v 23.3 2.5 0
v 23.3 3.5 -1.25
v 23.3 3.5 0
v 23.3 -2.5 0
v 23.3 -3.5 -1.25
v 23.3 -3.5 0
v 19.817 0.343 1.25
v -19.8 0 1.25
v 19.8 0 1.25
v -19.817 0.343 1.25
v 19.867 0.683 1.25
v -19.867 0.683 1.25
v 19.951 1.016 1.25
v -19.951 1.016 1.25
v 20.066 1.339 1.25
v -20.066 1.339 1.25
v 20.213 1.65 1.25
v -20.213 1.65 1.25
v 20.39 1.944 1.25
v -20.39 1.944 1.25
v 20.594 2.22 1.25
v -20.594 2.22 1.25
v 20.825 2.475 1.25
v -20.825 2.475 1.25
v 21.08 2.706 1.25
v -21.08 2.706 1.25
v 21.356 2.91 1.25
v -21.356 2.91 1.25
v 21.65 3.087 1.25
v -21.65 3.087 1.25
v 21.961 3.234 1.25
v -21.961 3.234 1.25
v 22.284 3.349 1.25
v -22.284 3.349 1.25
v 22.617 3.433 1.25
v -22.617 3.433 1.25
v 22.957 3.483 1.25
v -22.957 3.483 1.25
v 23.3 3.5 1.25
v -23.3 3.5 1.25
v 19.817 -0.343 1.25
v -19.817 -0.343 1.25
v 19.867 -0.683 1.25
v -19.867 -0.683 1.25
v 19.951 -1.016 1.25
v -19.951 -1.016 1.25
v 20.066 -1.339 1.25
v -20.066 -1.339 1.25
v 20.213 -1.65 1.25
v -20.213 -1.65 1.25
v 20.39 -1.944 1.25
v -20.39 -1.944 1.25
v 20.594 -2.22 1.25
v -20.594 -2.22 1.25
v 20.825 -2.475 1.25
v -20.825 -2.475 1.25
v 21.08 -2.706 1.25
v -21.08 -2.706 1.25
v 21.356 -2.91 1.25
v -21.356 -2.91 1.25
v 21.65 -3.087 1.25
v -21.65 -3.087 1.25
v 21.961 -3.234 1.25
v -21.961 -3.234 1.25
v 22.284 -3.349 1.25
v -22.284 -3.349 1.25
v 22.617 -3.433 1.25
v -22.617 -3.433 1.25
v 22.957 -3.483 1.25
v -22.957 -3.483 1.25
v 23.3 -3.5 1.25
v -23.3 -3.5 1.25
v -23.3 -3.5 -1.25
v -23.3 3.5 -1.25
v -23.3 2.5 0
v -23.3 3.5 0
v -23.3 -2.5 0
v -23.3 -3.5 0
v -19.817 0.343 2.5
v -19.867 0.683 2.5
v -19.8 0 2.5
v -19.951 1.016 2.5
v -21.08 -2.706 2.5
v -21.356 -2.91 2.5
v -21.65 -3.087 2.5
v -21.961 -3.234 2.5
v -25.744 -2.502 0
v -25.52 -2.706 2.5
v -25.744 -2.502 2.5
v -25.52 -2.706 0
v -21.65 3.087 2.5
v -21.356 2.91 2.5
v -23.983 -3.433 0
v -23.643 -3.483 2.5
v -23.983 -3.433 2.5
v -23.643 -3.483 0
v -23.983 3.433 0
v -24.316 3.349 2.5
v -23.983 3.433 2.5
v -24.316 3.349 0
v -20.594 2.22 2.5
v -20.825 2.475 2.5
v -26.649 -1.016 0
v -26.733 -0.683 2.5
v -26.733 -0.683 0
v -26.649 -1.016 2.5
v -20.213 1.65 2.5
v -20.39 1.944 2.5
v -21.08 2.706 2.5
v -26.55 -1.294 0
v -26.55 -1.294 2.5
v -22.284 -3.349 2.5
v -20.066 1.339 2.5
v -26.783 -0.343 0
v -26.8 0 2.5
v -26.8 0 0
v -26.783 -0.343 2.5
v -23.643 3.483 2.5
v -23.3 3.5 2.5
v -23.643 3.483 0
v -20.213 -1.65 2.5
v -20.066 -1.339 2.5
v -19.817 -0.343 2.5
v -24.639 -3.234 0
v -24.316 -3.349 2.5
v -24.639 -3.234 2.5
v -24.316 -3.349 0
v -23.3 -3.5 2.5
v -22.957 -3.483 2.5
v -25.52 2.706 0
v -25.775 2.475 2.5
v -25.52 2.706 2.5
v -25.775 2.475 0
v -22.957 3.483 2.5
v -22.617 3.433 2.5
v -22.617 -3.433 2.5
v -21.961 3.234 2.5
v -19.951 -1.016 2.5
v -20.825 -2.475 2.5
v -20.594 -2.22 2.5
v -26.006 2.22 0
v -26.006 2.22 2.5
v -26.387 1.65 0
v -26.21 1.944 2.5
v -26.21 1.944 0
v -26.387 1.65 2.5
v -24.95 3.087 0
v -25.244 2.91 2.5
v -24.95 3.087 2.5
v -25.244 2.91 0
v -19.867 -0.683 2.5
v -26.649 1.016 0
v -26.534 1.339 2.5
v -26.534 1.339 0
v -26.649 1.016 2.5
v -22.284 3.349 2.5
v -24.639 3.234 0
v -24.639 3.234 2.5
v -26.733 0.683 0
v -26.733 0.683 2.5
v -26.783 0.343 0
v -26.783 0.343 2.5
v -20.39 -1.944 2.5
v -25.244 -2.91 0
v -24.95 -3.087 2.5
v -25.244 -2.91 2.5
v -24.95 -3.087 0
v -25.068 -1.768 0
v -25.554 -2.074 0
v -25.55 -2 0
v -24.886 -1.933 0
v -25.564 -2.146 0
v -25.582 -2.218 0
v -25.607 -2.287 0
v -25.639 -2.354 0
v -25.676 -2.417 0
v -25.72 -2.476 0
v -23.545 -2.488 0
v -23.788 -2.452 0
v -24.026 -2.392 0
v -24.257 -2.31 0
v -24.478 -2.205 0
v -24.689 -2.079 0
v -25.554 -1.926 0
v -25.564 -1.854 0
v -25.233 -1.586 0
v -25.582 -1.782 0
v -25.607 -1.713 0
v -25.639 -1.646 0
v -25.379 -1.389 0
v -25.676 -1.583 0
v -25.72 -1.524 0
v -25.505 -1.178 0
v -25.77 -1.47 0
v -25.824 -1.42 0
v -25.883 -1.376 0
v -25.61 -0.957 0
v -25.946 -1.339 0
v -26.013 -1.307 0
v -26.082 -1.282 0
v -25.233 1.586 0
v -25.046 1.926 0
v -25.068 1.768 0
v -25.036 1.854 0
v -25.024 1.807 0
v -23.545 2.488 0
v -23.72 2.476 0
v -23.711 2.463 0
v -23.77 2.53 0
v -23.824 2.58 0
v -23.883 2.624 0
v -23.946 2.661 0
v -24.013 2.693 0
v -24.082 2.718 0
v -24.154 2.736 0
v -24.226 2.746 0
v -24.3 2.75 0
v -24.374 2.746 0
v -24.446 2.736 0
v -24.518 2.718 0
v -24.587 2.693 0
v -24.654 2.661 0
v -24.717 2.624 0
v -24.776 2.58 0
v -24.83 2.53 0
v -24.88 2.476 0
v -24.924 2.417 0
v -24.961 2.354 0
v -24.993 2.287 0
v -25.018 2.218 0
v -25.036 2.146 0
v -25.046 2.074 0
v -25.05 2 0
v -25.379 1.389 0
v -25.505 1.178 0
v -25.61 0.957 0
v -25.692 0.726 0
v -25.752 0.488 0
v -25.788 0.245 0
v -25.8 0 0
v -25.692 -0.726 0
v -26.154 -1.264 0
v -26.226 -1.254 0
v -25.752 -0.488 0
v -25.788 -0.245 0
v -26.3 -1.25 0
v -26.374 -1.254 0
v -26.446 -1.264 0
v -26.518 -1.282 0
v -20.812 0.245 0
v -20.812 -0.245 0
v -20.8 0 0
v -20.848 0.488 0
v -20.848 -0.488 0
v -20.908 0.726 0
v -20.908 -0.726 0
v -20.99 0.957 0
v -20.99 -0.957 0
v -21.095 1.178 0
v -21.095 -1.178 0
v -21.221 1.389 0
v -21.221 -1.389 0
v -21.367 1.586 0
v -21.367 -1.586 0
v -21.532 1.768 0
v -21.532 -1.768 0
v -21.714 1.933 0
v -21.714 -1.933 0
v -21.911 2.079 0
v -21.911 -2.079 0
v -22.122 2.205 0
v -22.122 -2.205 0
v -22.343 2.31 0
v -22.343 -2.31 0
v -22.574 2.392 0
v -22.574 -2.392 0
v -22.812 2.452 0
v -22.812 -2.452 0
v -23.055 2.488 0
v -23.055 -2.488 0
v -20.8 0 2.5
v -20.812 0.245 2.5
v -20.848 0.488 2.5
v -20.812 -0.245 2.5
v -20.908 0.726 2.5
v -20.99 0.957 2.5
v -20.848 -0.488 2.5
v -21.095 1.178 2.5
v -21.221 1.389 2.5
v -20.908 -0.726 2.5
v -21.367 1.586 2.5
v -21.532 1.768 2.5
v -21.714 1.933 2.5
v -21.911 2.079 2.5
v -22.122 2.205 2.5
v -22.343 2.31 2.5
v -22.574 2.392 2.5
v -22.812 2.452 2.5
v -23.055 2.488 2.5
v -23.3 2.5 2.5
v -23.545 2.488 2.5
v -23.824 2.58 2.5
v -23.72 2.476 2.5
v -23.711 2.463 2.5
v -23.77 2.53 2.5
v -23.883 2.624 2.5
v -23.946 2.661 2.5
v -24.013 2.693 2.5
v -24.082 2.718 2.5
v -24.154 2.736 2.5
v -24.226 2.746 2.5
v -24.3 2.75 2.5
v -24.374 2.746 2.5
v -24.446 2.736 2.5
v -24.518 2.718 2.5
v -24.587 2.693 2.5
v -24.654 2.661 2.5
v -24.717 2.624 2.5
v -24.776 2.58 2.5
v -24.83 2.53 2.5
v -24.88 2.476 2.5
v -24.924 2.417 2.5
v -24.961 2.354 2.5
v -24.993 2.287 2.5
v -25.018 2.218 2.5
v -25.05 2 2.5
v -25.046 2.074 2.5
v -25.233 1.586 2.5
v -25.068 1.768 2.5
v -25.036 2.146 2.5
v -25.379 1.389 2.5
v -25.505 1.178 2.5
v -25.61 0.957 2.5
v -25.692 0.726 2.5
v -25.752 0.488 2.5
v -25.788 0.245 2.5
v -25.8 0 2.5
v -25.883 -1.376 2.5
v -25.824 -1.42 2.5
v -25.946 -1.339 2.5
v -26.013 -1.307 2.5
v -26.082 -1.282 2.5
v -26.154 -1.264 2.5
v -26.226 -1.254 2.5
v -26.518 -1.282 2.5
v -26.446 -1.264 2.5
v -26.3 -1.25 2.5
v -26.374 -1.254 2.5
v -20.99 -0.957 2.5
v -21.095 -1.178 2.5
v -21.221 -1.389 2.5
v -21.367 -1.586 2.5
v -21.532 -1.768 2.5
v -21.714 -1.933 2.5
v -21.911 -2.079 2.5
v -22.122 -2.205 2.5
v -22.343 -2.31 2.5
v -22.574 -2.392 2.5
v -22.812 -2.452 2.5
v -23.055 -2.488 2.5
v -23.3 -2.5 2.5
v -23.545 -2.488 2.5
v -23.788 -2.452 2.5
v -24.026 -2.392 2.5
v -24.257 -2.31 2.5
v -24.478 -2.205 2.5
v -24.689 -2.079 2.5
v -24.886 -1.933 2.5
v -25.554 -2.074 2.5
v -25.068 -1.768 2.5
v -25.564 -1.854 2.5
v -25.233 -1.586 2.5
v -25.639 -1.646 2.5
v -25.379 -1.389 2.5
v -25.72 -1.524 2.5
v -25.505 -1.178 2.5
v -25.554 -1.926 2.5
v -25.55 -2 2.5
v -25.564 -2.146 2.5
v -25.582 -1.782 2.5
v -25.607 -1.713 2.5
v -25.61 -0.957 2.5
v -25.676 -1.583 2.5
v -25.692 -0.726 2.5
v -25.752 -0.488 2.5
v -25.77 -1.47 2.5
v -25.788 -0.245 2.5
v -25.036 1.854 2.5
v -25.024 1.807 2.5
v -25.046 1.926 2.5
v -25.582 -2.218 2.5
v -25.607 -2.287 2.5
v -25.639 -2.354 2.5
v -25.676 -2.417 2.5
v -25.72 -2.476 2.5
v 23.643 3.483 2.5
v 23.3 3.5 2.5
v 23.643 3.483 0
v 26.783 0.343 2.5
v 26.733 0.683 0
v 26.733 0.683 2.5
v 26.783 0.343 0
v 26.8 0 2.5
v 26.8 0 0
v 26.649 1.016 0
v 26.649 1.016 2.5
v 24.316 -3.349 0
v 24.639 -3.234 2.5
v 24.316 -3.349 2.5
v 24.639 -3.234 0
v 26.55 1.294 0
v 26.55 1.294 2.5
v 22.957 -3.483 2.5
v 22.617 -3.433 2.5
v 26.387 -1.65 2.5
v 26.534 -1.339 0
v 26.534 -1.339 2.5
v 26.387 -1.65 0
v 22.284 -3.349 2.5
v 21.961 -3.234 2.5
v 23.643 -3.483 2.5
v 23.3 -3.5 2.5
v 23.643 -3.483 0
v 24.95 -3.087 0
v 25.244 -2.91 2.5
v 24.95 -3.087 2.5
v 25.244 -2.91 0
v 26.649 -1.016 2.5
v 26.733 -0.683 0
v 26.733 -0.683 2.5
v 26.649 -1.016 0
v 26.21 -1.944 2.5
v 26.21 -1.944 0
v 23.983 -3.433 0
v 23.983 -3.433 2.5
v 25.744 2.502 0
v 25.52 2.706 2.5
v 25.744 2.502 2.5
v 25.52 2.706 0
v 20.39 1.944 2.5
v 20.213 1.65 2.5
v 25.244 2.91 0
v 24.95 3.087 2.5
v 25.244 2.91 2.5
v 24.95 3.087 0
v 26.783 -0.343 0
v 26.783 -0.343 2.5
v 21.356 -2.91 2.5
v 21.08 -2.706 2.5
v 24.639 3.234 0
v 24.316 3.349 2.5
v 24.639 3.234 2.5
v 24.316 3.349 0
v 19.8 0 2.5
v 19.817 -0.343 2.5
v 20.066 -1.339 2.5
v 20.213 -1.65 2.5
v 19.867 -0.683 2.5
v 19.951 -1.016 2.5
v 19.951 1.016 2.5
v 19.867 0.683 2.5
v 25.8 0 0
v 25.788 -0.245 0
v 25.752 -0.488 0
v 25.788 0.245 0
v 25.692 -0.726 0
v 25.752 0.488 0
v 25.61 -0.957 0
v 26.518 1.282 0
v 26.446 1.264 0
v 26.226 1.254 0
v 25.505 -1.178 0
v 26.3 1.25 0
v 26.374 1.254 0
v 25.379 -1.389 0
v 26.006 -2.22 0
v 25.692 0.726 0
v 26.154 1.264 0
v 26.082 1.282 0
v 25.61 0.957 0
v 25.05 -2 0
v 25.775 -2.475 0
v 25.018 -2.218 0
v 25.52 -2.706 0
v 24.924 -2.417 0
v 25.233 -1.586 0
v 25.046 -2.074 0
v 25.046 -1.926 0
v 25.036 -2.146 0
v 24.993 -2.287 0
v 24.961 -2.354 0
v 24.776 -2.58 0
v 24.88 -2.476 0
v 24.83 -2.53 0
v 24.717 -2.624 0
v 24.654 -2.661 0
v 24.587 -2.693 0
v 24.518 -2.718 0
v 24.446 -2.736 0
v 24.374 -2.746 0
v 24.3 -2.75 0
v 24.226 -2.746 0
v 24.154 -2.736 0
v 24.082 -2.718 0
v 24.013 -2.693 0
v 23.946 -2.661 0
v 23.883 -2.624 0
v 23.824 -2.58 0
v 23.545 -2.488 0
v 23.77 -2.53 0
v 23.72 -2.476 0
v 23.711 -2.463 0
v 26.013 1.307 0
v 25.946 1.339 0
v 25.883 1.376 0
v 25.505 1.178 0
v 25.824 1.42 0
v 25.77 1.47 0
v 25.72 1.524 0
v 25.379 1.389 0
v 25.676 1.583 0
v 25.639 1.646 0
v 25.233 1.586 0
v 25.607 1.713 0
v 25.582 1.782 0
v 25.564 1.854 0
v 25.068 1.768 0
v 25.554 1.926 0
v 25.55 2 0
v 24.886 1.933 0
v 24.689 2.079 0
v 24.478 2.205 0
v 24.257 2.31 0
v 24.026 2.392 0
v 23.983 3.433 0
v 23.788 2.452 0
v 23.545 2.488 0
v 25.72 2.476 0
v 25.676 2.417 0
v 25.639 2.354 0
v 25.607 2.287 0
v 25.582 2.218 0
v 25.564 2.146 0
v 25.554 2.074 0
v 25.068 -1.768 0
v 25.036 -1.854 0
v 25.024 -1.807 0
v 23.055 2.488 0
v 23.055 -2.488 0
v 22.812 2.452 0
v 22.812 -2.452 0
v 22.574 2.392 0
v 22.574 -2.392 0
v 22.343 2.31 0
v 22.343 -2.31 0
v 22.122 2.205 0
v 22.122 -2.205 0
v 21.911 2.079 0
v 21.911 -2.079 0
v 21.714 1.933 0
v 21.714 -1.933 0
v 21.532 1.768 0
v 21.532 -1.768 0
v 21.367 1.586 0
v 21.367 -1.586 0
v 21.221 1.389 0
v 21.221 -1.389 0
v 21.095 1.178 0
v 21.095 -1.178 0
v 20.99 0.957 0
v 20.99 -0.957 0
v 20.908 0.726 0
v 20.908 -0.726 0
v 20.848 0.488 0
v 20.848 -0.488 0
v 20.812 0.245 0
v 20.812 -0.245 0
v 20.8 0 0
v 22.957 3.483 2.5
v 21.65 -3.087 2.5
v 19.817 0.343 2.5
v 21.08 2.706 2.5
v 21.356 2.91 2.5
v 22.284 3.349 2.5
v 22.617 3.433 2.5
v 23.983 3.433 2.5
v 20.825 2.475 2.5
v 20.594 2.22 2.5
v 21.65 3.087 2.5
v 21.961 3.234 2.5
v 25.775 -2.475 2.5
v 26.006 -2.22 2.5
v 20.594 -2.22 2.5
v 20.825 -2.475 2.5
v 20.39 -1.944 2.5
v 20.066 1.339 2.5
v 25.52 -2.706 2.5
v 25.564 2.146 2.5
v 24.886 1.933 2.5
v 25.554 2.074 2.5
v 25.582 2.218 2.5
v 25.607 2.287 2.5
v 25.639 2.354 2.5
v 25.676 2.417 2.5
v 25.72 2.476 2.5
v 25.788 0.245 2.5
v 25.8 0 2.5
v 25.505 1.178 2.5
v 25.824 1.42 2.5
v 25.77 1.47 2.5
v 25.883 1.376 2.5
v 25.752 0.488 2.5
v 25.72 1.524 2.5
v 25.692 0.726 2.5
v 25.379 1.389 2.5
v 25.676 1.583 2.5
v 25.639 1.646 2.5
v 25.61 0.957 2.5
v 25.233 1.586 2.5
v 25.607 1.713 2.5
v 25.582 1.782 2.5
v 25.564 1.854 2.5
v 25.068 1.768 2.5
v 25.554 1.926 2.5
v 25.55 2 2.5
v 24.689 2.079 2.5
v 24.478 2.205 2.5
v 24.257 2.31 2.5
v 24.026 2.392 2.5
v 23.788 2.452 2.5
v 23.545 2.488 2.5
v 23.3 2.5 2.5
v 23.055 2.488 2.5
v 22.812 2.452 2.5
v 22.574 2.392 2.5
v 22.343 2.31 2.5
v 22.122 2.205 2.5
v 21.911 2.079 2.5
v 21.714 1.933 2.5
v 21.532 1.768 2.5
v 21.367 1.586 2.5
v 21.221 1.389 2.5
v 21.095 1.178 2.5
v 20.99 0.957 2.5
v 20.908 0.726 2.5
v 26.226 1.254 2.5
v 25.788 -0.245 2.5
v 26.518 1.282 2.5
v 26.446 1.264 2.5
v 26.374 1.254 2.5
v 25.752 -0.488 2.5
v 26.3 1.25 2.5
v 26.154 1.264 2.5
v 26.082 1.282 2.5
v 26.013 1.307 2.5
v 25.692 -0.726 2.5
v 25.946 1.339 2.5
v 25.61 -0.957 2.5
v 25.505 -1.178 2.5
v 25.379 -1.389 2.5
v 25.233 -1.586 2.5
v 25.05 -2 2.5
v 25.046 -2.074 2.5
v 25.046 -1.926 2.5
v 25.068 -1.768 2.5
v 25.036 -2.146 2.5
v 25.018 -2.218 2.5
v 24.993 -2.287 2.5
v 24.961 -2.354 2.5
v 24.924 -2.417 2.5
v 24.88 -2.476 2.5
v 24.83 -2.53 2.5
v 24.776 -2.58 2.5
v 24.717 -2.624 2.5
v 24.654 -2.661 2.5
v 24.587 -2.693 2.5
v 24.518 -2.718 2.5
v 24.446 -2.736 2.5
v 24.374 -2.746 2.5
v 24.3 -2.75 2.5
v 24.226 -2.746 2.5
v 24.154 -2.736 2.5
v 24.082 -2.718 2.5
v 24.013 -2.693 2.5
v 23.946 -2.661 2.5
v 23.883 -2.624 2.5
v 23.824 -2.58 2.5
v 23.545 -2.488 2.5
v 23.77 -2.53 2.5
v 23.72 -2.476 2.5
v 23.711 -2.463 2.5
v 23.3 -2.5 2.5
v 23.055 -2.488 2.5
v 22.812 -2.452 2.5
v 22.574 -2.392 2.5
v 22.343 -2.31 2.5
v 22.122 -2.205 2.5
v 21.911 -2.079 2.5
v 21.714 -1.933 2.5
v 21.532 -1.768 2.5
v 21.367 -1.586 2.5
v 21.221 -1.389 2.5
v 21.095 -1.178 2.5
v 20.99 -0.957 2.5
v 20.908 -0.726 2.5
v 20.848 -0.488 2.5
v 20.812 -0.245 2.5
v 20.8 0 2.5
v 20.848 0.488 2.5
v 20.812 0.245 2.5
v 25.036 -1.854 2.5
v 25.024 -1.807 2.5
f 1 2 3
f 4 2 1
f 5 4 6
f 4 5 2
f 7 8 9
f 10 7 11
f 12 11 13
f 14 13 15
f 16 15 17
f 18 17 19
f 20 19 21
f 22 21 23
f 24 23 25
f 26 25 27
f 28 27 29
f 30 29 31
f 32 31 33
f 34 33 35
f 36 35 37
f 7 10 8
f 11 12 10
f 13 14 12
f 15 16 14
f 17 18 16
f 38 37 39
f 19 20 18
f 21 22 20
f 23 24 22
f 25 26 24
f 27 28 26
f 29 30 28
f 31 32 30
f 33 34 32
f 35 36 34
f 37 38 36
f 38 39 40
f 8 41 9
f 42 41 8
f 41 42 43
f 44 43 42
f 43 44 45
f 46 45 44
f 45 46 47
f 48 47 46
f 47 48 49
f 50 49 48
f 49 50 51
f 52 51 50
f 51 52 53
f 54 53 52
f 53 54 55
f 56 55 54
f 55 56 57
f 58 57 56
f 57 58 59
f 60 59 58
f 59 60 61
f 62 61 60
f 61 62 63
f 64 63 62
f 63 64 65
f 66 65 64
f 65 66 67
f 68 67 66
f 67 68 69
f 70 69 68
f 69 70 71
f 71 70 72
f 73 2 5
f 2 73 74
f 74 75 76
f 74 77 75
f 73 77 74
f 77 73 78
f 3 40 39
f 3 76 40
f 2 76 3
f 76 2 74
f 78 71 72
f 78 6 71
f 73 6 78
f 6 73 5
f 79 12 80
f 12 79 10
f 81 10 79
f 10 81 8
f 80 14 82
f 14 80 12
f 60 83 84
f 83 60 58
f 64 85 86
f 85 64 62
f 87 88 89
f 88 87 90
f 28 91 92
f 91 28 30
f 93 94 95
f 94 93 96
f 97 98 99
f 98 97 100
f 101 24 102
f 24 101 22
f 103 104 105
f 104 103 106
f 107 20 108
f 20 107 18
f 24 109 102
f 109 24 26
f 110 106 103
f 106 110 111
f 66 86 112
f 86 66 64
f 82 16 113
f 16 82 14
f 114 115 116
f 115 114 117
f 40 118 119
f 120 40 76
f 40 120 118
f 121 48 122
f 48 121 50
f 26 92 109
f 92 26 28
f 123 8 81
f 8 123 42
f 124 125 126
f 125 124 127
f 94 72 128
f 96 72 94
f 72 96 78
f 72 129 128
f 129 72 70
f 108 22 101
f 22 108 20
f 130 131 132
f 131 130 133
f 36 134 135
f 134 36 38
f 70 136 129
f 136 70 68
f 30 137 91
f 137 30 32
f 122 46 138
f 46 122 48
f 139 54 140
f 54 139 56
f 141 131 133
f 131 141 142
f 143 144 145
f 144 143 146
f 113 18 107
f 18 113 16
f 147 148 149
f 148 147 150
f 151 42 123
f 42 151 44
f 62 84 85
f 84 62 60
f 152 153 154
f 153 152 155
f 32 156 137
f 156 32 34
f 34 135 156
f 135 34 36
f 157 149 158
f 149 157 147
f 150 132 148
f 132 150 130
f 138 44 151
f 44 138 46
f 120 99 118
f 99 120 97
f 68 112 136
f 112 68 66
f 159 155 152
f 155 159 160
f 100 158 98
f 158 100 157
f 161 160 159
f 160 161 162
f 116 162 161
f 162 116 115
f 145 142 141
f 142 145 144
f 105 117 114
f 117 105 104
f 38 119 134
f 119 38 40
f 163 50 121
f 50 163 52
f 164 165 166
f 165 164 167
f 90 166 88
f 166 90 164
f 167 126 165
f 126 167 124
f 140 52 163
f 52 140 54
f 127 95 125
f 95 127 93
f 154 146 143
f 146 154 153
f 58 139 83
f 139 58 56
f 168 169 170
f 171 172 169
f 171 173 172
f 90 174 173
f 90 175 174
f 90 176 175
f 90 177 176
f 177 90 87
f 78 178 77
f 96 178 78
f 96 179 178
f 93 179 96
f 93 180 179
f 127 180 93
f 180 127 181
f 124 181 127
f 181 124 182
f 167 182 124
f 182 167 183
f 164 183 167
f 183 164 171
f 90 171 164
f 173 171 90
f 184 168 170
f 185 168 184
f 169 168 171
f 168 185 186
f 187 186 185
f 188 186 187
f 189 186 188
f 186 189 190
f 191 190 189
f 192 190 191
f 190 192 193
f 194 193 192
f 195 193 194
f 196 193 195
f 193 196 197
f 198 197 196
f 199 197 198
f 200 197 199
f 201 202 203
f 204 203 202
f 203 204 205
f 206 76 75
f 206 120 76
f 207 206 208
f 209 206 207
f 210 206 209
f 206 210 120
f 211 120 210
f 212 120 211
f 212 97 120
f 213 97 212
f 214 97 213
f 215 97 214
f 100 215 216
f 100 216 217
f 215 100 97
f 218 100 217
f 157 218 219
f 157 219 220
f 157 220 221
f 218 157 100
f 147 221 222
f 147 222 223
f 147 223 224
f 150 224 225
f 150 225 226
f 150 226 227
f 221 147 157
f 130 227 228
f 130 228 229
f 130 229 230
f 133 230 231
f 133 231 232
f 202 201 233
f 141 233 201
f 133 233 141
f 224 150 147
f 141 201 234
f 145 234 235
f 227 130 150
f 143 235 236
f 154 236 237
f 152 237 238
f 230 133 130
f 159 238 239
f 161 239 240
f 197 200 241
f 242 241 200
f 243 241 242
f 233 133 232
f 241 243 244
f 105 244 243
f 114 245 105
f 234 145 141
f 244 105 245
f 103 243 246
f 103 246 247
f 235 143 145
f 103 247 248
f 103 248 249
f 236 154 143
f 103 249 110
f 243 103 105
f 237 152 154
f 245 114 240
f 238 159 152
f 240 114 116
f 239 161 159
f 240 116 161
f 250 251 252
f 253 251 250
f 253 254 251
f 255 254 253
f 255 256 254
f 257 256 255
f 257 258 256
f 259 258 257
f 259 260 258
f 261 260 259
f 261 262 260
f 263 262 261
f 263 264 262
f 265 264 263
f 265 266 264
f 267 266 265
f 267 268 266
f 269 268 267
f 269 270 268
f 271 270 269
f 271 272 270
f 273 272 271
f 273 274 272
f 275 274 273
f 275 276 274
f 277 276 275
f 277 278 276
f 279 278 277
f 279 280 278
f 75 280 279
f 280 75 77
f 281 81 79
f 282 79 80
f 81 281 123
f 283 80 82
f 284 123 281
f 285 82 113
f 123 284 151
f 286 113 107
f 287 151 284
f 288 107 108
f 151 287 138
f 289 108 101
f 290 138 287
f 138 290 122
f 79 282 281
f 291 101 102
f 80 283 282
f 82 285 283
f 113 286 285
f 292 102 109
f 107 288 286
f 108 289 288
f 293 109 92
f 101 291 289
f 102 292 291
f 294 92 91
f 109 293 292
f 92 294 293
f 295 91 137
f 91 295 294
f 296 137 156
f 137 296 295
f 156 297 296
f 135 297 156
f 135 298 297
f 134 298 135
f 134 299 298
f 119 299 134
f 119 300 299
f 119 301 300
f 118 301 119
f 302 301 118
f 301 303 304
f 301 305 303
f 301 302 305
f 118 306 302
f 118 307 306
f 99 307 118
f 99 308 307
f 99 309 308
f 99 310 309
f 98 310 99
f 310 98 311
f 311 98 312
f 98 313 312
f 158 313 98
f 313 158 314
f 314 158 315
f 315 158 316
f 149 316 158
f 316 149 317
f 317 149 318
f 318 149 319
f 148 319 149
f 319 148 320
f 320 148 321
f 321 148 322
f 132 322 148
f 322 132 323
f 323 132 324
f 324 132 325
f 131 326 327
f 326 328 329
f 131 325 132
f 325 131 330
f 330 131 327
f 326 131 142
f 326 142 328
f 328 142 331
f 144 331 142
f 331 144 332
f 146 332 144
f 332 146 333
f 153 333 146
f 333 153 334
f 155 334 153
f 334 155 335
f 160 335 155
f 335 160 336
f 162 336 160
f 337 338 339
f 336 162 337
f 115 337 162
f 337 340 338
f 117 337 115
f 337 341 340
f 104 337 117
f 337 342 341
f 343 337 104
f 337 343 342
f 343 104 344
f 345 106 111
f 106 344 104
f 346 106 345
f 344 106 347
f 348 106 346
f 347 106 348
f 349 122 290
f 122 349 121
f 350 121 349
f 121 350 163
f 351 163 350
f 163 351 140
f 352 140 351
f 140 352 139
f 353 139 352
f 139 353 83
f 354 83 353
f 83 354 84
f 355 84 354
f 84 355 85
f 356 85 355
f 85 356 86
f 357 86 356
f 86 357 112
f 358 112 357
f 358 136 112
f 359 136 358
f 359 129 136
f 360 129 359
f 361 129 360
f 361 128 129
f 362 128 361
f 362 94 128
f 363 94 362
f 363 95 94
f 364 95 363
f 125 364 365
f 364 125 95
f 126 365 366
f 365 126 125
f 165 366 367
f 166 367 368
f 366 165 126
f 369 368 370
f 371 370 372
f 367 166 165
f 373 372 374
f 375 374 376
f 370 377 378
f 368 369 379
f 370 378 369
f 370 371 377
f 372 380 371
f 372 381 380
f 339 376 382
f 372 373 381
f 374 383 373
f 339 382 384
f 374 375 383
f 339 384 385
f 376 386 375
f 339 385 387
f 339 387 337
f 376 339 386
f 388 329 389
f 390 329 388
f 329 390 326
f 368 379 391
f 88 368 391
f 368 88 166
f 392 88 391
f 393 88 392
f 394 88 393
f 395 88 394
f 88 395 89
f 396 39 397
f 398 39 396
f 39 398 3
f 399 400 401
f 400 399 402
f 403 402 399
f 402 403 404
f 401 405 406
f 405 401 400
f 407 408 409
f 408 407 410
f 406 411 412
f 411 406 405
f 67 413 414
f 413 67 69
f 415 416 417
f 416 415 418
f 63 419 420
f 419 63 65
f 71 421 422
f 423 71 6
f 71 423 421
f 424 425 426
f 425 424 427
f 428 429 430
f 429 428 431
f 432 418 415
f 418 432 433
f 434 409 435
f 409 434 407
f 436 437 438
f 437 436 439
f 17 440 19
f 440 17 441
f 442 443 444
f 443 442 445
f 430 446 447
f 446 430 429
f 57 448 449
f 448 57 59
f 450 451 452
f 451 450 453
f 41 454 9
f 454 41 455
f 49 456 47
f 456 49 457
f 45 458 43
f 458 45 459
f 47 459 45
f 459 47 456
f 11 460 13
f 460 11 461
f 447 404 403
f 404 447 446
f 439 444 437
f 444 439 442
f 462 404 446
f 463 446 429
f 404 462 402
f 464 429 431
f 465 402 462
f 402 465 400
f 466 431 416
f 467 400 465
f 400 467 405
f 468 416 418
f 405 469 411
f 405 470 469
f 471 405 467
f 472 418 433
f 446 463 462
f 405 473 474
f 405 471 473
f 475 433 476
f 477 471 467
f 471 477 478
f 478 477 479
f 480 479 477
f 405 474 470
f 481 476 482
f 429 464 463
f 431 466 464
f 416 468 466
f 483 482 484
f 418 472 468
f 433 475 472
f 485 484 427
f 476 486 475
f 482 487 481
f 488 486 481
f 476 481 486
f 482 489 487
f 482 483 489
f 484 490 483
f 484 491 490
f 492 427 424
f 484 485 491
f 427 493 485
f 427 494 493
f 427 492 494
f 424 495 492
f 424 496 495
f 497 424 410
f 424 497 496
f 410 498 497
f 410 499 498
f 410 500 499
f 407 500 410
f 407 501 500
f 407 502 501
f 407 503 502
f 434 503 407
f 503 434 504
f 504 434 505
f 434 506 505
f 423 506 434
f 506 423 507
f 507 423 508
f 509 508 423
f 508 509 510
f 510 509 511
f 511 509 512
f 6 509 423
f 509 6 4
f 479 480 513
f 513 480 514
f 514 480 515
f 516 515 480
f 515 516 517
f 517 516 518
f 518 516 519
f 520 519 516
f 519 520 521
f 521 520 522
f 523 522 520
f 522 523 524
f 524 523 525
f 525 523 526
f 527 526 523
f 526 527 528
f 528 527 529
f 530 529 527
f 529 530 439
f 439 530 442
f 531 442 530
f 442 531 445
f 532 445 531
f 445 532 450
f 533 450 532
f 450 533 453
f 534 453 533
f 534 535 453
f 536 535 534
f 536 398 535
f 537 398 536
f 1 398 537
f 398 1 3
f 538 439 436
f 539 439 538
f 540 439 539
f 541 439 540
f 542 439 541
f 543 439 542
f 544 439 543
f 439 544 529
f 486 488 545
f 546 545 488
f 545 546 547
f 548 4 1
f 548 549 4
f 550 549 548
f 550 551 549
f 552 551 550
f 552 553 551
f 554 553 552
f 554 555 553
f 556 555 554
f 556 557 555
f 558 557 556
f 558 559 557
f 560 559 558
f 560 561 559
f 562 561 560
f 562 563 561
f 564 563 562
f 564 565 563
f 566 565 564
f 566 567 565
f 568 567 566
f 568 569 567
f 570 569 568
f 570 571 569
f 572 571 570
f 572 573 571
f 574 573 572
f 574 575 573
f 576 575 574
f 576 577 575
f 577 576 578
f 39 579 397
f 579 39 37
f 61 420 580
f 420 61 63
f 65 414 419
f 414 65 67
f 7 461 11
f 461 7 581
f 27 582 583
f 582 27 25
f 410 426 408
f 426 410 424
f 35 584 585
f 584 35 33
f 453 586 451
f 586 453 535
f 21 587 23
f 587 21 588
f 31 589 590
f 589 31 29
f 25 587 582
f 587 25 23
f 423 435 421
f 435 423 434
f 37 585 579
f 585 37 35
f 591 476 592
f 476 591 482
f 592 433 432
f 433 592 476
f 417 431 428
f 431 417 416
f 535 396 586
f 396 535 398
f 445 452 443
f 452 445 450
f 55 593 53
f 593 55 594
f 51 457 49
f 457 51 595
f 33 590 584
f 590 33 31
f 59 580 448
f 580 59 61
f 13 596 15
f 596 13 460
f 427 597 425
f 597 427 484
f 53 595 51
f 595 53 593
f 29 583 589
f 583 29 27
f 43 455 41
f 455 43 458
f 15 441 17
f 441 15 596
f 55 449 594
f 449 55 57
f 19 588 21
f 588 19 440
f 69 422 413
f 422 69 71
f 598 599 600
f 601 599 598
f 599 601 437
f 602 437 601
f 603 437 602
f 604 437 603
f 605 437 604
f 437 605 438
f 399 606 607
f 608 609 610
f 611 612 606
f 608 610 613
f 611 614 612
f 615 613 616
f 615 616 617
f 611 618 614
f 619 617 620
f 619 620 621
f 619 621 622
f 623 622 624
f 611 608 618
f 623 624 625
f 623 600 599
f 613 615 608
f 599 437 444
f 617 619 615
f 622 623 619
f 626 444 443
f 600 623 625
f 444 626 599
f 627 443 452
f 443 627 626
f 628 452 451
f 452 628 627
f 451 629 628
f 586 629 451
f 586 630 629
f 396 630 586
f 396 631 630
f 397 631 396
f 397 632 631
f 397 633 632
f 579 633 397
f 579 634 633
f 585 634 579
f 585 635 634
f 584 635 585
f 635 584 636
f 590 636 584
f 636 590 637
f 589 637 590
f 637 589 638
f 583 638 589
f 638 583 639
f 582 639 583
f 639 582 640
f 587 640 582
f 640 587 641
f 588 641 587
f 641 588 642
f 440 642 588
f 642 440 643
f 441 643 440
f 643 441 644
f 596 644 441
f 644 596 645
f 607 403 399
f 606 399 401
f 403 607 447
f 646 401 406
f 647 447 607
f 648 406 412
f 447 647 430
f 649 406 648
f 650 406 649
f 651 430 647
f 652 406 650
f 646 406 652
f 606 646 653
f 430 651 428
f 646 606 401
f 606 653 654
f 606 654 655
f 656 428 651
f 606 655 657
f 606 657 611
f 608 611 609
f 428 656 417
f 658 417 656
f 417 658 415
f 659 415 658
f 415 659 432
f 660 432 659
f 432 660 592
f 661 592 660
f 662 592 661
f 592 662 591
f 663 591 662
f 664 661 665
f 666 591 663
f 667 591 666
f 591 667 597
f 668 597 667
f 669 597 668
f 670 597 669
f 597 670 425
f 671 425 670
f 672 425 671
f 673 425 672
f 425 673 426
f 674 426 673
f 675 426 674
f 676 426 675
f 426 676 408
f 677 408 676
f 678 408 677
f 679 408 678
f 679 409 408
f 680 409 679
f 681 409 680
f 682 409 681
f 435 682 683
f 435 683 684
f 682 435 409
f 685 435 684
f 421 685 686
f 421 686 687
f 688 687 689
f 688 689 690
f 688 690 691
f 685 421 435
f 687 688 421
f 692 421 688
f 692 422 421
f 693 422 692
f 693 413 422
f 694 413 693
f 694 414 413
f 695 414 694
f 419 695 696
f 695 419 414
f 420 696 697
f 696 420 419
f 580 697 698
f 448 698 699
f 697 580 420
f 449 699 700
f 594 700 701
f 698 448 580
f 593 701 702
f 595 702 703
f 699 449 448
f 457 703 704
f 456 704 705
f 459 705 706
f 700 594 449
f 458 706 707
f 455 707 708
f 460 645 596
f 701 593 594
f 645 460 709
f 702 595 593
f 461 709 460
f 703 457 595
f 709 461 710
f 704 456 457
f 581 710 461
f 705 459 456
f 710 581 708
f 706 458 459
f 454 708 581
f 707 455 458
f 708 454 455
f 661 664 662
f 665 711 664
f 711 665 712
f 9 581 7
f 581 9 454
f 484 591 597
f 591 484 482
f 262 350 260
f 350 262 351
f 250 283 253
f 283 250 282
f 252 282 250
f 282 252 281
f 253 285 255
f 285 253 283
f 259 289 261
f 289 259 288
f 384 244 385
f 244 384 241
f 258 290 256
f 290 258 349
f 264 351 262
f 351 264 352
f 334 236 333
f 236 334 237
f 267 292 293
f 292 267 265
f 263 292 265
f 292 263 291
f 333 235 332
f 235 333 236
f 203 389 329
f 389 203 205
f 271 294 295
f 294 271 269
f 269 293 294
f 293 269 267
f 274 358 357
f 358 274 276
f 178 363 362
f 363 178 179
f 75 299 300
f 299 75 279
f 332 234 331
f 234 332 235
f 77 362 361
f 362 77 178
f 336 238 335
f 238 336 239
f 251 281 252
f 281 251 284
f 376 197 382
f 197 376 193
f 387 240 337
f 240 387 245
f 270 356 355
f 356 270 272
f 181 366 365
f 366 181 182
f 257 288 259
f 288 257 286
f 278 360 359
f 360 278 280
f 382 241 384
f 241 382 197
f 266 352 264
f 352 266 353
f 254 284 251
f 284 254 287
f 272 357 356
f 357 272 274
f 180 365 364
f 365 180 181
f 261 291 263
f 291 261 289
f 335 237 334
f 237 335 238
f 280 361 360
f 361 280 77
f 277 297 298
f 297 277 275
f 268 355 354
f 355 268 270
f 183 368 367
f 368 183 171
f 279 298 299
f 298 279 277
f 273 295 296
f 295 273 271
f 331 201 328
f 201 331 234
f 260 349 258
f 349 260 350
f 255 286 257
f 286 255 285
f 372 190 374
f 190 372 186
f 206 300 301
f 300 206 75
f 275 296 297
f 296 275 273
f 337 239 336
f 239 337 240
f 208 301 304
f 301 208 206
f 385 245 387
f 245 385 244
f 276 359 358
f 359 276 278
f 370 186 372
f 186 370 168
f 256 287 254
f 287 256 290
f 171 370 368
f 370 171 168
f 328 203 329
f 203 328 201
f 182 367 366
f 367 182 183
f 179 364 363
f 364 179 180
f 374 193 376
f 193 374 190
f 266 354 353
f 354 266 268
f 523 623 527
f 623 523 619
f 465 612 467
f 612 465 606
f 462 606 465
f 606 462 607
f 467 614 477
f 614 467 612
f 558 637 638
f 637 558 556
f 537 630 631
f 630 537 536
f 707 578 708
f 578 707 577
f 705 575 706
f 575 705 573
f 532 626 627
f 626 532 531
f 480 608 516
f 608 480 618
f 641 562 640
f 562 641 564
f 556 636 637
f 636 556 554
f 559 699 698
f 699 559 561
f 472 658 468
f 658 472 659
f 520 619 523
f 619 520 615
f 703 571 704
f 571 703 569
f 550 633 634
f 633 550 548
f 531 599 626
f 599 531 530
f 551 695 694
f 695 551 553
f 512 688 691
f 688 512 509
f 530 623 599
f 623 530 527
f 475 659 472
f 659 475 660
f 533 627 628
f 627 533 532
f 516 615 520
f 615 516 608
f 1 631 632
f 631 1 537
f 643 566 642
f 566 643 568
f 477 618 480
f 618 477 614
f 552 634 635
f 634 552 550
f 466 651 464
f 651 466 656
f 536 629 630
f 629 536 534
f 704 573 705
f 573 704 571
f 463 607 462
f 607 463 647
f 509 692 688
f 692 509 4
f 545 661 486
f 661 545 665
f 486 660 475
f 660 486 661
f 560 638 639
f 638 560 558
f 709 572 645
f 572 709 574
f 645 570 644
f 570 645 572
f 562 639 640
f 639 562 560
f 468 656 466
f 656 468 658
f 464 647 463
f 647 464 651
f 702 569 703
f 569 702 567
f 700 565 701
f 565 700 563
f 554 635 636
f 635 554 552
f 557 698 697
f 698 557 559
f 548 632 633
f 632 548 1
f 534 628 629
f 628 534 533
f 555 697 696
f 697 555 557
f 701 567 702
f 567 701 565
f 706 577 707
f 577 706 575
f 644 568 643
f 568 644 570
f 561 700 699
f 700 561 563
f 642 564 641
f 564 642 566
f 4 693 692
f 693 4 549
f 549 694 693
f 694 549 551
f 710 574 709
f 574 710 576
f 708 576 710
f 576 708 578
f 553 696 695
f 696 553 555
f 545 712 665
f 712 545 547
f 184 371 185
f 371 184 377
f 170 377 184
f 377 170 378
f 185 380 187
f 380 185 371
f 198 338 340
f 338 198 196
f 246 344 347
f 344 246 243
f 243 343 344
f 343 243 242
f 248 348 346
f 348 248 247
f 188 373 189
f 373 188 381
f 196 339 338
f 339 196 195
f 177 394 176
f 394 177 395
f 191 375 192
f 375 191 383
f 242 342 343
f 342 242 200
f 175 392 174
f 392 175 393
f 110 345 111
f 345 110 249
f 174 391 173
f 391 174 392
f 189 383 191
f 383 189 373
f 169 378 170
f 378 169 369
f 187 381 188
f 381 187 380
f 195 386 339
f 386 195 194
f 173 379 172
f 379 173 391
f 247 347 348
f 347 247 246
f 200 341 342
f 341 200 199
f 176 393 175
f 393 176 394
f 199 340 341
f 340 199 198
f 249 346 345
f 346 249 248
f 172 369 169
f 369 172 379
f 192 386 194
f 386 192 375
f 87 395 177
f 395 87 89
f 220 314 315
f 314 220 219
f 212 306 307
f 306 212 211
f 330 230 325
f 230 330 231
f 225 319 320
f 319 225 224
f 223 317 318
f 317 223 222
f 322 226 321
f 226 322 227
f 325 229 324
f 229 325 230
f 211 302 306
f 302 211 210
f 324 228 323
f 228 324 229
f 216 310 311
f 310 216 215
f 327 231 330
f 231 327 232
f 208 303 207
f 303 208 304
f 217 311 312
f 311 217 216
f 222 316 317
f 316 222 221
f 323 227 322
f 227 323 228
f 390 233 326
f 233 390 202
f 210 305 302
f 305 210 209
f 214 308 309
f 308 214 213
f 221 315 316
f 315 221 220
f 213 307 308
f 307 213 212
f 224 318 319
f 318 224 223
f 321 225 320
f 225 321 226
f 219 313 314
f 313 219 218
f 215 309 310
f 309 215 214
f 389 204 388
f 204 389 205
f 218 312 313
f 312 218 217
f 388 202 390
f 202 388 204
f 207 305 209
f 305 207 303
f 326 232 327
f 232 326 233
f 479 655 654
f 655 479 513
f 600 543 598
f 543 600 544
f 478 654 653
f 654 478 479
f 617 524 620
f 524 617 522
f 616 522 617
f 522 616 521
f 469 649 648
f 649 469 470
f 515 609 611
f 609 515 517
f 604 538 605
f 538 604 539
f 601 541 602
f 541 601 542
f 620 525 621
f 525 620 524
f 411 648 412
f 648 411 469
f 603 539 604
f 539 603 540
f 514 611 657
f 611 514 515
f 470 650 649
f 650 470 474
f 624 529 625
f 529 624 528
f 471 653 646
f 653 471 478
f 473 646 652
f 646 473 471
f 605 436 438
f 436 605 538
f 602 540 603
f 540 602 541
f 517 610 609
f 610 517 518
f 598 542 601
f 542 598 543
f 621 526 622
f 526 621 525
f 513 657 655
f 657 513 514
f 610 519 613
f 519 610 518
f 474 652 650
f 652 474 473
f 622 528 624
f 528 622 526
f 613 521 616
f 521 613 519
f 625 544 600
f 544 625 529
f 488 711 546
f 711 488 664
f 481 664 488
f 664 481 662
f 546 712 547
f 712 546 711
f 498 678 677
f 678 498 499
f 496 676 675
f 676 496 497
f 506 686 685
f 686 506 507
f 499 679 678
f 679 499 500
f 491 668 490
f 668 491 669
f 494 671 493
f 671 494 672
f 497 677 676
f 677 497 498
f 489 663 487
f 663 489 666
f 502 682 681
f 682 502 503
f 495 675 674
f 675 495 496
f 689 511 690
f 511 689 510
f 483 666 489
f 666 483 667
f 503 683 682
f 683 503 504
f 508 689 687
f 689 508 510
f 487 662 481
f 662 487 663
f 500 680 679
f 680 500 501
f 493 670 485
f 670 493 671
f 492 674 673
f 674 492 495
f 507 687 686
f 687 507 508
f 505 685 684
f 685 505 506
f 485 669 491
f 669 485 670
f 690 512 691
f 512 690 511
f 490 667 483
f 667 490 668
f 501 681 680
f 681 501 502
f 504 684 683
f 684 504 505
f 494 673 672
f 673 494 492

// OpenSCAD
module link_plate() {
    difference() {
        // Main body of the plate
        union() {
            // Central rectangular part
            cube([46.6, 7.0, 2.5], center=true);
            // Rounded ends
            translate([-23.3, 0, 0])
                cylinder(h=2.5, r=3.5, $fn=64);
            translate([23.3, 0, 0])
                cylinder(h=2.5, r=3.5, $fn=64);
        }
        // Large through-holes
        translate([-23.3, 0, 0])
            cylinder(h=3, r=2.5, $fn=64);
        translate([23.3, 0, 0])
            cylinder(h=3, r=2.5, $fn=64);
        // Small through-holes pattern (left side)
        translate([-28.3, 2.0, 0])
            cylinder(h=3, r=0.75, $fn=64);
        translate([-26.3, -2.0, 0])
            cylinder(h=3, r=0.75, $fn=64);
        translate([-24.3, 2.0, 0])
            cylinder(h=3, r=0.75, $fn=64);
        // Small through-holes pattern (right side, mirrored)
        translate([28.3, -2.0, 0])
            cylinder(h=3, r=0.75, $fn=64);
        translate([26.3, 2.0, 0])
            cylinder(h=3, r=0.75, $fn=64);
        translate([24.3, -2.0, 0])
            cylinder(h=3, r=0.75, $fn=64);
    }
}

link_plate();
